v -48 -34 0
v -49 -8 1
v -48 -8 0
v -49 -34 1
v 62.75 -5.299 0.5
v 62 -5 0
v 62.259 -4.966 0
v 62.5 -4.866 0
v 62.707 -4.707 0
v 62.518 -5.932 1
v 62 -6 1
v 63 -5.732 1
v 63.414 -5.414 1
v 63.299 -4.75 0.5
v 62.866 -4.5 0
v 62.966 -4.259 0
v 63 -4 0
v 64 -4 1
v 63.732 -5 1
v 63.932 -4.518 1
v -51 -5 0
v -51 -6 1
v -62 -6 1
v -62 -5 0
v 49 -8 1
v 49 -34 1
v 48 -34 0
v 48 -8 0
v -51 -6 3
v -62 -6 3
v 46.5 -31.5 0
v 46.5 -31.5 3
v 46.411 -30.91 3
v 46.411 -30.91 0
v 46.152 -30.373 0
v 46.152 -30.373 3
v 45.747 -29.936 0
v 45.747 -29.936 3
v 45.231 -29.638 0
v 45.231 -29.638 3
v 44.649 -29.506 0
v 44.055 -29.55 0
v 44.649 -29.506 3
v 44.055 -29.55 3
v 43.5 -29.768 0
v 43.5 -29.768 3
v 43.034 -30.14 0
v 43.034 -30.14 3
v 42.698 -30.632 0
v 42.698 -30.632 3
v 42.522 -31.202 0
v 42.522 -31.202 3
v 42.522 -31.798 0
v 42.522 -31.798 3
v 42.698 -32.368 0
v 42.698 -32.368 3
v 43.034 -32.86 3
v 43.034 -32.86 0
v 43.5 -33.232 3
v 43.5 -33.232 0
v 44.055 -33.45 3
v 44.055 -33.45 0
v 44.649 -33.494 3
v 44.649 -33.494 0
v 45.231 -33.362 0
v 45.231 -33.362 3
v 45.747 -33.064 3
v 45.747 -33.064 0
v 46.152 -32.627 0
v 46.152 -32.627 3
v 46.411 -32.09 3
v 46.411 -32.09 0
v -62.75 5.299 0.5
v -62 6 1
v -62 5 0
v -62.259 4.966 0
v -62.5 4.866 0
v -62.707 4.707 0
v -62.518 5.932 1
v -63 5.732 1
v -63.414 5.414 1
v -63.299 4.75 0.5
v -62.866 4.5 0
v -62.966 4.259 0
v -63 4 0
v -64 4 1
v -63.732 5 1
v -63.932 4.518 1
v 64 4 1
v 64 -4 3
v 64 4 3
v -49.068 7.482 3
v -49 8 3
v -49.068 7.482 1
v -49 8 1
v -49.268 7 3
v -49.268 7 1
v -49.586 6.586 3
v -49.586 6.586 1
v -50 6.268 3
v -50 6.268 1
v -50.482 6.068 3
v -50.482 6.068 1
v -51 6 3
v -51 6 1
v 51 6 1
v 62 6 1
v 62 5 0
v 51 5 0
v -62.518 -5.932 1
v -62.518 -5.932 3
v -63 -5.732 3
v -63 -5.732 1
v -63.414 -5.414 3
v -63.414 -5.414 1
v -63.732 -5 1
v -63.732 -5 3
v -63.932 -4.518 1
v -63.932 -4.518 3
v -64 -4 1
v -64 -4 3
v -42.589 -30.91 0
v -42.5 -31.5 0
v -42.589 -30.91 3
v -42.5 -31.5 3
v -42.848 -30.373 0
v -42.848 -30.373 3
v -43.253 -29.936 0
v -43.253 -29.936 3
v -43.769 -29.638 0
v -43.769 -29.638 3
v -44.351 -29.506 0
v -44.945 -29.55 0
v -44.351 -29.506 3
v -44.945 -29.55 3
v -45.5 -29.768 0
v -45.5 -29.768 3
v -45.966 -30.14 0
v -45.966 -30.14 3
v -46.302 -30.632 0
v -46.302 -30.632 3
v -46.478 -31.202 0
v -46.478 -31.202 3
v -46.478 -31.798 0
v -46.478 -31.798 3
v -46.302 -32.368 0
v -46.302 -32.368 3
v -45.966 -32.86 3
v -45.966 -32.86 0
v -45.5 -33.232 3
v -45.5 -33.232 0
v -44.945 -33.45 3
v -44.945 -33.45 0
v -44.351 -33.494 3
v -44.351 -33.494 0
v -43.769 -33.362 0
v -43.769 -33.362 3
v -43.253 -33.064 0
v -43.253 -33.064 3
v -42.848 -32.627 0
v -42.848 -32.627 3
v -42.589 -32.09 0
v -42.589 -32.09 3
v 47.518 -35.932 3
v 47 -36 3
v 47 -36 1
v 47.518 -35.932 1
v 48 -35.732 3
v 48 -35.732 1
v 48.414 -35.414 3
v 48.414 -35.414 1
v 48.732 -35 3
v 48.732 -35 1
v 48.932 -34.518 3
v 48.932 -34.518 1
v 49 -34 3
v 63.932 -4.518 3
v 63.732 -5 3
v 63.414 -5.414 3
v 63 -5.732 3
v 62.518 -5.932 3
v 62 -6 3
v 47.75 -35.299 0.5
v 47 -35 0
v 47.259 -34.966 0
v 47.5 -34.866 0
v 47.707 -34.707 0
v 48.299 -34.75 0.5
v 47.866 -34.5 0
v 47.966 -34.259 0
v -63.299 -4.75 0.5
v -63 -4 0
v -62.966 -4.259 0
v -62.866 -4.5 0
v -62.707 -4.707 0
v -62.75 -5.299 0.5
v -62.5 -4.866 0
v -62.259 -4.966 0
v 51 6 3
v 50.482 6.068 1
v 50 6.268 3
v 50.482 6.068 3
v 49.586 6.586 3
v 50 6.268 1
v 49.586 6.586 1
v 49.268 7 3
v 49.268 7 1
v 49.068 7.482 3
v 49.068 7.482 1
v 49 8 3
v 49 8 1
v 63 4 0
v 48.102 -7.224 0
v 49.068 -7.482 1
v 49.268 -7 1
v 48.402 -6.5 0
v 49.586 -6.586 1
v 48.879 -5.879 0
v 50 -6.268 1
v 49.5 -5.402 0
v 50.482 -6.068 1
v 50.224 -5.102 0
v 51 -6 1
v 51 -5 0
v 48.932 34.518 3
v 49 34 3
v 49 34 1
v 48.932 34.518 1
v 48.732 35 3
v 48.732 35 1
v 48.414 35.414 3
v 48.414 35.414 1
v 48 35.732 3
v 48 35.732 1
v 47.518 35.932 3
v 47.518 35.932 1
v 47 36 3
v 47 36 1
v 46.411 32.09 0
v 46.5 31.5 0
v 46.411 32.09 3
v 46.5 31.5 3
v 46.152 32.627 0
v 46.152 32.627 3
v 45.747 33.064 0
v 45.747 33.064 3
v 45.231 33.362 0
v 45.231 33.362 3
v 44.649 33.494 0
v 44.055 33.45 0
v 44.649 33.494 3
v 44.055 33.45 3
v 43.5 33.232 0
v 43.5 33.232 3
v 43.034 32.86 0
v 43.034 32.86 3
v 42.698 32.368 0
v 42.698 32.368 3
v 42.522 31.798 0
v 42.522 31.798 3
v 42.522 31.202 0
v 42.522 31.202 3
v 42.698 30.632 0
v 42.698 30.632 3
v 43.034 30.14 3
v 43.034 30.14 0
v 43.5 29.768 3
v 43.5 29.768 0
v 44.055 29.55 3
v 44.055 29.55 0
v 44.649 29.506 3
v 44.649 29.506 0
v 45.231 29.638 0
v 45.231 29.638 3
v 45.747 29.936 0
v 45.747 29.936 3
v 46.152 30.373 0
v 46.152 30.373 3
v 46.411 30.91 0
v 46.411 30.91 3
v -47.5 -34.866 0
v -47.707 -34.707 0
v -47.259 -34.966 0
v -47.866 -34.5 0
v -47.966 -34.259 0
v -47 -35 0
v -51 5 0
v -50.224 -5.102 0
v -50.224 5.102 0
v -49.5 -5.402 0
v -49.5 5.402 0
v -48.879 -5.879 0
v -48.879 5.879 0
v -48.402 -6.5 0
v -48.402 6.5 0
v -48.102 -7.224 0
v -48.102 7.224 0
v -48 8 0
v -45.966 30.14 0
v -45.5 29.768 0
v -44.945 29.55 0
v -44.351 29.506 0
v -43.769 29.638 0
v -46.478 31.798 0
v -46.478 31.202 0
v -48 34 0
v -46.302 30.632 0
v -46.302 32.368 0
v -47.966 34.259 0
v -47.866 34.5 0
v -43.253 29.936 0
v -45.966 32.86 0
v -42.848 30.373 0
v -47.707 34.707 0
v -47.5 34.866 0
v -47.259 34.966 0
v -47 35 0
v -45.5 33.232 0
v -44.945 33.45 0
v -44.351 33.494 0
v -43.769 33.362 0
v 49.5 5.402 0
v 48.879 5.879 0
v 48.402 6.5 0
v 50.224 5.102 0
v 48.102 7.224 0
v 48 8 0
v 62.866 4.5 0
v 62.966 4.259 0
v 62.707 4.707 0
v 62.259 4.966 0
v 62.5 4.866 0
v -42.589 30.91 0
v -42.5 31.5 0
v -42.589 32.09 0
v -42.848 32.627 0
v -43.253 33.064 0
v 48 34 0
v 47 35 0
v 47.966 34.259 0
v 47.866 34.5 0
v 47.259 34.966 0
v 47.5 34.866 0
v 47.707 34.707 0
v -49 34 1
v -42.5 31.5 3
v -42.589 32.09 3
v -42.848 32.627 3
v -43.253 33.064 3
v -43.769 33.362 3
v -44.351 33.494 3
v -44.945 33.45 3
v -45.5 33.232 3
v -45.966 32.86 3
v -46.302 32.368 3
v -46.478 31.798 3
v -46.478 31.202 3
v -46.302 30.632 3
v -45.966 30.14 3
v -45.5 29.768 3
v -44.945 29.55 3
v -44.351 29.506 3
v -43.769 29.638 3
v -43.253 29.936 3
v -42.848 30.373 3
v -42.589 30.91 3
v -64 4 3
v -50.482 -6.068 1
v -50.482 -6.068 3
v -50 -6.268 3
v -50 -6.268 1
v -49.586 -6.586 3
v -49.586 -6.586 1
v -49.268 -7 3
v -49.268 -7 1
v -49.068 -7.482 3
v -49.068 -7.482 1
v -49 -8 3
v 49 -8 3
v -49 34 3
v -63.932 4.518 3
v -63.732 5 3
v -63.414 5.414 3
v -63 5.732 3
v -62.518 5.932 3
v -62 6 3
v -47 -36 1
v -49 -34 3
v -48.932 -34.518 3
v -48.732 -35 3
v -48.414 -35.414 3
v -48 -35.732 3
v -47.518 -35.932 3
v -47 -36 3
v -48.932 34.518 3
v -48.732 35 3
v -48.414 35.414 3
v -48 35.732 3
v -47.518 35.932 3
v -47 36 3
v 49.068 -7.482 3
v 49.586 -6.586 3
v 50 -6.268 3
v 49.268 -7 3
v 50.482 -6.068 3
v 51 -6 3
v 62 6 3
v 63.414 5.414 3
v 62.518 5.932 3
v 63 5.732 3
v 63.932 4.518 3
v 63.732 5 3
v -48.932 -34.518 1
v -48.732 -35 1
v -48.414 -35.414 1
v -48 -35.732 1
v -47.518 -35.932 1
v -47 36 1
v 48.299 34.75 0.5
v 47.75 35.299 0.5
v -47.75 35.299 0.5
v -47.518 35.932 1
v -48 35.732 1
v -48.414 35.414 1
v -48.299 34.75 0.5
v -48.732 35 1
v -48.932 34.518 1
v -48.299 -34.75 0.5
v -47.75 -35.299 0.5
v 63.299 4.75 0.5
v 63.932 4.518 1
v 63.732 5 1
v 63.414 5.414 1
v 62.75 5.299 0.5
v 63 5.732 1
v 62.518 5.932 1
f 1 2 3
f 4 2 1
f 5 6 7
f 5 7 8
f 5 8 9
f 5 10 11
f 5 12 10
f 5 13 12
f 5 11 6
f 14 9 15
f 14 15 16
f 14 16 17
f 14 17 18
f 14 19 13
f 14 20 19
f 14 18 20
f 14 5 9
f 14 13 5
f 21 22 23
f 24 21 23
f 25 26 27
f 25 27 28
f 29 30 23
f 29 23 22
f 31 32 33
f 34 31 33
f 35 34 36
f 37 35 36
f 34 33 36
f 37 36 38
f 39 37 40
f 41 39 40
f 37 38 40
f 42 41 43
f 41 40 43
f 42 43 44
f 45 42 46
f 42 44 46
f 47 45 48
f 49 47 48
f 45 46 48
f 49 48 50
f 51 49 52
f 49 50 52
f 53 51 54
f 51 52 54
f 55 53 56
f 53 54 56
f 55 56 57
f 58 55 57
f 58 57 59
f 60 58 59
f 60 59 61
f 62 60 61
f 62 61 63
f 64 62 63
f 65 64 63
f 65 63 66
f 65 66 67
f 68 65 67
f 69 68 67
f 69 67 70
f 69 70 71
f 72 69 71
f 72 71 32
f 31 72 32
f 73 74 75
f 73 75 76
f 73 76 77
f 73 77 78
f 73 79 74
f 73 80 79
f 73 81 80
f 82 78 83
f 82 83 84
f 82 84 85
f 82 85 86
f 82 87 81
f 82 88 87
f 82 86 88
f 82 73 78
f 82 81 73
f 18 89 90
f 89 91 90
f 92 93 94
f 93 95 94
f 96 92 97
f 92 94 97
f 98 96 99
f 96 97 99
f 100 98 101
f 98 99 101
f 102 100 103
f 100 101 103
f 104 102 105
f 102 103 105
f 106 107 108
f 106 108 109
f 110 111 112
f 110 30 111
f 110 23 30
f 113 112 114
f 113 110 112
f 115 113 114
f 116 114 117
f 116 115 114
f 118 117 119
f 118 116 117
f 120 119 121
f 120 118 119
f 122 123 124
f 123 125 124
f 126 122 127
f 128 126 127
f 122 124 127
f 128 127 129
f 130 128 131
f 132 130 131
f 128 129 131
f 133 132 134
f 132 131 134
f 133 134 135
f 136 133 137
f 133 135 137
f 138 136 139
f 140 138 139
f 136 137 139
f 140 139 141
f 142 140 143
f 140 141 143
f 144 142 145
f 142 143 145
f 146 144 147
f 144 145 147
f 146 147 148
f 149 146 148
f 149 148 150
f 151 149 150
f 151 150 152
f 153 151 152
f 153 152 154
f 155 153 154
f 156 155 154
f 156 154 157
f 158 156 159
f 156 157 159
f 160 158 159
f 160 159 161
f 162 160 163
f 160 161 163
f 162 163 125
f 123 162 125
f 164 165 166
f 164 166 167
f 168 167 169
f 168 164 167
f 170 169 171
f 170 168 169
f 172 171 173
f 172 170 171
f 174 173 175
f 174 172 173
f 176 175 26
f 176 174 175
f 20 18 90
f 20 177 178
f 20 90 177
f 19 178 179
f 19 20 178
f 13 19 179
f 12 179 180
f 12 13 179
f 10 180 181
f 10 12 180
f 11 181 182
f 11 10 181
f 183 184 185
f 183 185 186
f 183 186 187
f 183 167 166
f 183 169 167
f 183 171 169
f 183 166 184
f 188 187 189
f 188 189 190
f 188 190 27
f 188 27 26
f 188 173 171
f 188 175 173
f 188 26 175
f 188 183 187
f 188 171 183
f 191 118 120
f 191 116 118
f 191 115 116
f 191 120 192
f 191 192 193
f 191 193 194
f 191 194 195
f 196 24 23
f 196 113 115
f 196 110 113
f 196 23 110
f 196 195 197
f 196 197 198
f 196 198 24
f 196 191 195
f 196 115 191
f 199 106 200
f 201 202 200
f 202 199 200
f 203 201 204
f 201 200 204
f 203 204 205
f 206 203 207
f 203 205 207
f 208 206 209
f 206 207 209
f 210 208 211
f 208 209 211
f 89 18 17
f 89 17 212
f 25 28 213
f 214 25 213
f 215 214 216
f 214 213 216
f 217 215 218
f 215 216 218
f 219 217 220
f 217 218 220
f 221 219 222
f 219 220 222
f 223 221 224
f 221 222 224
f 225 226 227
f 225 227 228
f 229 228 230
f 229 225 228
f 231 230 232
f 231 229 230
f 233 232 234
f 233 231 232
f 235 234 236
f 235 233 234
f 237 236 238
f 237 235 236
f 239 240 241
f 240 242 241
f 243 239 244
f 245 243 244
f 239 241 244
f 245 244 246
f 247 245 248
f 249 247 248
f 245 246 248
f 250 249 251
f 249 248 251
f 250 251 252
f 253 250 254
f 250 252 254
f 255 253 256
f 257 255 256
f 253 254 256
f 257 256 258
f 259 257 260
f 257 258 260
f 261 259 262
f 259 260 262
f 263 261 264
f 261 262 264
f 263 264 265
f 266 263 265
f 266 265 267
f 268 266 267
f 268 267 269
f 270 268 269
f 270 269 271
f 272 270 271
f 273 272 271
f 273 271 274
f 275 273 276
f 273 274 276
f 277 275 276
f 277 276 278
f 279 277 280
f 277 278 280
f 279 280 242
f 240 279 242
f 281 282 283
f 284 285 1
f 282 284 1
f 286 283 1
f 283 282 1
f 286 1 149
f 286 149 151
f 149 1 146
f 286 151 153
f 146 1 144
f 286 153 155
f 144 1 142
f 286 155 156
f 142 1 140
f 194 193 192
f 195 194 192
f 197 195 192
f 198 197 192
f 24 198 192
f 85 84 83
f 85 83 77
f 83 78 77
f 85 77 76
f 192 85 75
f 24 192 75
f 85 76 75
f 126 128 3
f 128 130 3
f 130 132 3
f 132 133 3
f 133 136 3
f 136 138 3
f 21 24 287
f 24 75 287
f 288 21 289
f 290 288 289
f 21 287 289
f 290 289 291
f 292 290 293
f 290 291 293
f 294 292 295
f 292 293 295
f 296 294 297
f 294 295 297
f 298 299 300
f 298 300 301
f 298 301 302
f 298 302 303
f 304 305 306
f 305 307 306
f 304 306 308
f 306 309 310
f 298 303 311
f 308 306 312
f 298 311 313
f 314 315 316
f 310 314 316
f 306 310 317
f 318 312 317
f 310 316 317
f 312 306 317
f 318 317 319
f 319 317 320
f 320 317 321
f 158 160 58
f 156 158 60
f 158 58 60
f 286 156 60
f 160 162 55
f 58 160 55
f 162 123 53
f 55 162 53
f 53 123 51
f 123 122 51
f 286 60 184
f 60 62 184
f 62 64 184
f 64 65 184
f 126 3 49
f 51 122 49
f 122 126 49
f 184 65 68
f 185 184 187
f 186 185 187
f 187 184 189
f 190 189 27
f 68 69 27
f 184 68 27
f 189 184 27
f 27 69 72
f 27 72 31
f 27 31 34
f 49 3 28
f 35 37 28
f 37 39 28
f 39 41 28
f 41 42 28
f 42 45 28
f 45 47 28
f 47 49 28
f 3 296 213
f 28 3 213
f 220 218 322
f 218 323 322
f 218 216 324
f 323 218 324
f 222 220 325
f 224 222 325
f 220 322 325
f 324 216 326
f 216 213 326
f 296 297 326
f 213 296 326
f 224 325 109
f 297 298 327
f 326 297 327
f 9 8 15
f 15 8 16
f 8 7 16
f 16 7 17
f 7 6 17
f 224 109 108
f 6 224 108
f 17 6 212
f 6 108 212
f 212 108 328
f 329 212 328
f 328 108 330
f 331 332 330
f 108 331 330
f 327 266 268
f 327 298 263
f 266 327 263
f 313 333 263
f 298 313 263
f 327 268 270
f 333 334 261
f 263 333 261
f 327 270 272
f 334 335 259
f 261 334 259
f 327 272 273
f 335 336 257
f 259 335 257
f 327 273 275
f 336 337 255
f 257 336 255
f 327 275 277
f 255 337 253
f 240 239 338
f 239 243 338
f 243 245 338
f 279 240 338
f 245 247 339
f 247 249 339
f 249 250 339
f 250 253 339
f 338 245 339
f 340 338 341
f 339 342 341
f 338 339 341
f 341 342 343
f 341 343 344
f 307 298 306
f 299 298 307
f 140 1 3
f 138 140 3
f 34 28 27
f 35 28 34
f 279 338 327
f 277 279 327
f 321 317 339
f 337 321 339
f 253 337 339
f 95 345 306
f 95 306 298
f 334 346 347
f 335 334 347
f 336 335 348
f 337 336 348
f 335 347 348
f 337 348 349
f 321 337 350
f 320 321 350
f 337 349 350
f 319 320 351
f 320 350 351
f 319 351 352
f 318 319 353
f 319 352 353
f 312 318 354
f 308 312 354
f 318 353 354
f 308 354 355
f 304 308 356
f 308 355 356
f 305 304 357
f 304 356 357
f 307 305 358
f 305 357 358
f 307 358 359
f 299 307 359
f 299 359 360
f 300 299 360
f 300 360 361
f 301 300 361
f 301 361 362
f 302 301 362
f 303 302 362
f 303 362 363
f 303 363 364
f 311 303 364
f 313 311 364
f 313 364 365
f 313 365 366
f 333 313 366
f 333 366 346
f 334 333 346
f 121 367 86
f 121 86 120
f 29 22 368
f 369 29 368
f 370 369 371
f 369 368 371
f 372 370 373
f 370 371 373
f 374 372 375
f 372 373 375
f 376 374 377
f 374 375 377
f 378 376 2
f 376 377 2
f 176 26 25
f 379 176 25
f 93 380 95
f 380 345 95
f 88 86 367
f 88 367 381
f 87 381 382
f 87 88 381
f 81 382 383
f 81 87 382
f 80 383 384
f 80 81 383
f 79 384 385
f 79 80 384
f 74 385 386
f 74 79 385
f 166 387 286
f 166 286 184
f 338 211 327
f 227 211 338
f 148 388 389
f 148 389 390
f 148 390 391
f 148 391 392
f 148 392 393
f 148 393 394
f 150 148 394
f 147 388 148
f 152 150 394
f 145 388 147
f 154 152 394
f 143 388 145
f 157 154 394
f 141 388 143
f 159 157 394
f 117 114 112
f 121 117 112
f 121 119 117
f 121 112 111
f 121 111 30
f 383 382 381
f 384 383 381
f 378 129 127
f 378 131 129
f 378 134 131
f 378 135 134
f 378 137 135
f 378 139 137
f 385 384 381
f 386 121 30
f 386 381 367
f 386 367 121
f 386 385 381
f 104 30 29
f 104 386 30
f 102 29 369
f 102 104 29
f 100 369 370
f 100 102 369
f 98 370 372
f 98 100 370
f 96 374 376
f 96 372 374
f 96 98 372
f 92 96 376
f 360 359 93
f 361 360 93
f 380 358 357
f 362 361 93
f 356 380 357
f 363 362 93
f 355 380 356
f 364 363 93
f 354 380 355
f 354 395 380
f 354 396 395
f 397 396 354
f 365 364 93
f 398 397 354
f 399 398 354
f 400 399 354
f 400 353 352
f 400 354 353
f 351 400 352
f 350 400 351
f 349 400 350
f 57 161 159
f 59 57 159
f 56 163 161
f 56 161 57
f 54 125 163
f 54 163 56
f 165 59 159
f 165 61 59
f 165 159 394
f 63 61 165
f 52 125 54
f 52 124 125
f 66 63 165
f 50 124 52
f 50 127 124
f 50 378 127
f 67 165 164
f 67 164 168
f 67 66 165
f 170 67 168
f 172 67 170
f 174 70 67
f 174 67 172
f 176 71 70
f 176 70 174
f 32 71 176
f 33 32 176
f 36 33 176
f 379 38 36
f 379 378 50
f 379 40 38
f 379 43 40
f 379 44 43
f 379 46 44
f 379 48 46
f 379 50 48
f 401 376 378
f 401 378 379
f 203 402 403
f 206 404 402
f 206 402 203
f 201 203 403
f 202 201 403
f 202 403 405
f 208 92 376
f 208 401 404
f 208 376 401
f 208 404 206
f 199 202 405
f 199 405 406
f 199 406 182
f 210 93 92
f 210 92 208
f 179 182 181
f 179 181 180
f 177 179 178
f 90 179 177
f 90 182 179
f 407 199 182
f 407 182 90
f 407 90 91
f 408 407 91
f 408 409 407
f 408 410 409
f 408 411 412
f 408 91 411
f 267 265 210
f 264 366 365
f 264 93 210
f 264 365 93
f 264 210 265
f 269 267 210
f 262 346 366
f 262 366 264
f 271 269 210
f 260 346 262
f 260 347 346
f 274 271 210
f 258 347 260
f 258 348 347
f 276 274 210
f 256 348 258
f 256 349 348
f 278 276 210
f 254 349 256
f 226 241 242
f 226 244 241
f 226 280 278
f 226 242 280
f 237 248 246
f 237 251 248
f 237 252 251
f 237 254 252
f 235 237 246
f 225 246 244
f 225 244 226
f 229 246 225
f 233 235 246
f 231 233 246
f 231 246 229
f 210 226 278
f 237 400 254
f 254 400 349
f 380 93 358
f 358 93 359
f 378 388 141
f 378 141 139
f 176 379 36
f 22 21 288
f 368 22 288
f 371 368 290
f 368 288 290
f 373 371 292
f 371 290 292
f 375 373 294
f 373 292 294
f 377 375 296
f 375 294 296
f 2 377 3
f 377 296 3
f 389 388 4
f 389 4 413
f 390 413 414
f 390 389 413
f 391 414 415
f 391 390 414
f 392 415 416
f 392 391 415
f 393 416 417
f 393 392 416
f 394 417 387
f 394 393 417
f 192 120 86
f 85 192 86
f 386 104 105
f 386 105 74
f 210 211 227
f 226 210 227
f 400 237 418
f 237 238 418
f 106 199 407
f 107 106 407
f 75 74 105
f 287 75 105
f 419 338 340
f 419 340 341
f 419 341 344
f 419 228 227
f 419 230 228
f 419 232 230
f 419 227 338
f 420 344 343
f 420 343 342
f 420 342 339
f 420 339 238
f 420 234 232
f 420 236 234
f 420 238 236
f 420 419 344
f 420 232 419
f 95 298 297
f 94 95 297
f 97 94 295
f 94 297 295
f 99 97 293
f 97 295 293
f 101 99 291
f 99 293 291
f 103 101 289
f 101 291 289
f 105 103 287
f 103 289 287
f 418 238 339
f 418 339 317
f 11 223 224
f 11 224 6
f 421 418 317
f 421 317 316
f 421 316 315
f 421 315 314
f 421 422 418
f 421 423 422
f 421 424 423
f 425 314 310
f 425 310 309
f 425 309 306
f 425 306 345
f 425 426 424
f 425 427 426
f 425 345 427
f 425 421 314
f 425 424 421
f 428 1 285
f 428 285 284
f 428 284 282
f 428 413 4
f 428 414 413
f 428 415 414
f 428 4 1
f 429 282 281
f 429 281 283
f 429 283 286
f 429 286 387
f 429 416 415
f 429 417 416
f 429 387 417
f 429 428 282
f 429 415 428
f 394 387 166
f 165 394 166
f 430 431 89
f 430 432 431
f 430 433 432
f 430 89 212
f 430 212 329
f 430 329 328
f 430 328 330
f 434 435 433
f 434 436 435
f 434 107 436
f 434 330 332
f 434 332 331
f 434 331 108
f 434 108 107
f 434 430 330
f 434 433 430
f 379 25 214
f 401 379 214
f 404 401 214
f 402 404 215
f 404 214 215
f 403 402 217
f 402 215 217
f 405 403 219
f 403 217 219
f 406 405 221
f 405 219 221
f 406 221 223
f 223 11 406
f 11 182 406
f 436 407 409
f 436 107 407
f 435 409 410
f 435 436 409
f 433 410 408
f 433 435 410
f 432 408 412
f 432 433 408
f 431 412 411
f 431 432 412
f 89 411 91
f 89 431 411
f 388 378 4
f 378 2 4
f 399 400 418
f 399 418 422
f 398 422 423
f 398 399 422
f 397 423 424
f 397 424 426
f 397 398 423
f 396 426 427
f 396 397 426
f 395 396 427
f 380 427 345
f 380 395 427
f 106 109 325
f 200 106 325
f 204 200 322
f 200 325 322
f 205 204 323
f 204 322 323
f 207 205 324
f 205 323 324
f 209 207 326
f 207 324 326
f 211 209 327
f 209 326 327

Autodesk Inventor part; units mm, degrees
ref_plane "YZ Plane" through (0, 0, 0) normal (1, 0, 0) x (0, 1, 0)
ref_plane "XZ Plane" through (0, 0, 0) normal (0, 1, 0) x (-1, 0, 0)
ref_plane "XY Plane" through (0, 0, 0) normal (0, 0, 1) x (1, 0, 0)
sketch "Sketch1" plane through (0, 0, 0) normal (0, 0, 1) x (1, 0, 0)
  line L0 (-49, -36) -> (49, -36)
  line L1 (49, -36) -> (49, 36)
  line L2 (49, 36) -> (-49, 36)
  line L3 (-49, 36) -> (-49, -36)
  line L4 (-49, -36) -> (49, 36) construction
  line L5 (49, -36) -> (-49, 36) construction
  point P0 (0, 0)
  dimension "d0" = 98
  dimension "d1" = 72
extrude "Extrusion1" add sketch "Sketch1" along normal blind 3
sketch "Sketch2" plane through (0, 0, 3) normal (0, 0, 1) x (1, 0, 0)
  circle A0 centre (-44.5, 31.5) radius 2
  line L0 (-68.6, 0) -> (68.6, 0) projected
  line L1 (0, 50.4) -> (0, -50.4) construction
  circle A1 centre (44.5, 31.5) radius 2
  circle A2 centre (-44.5, -31.5) radius 2
  circle A3 centre (44.5, -31.5) radius 2
  point P0 (0, 0)
  dimension "d4" = 4
  dimension "d5" = 89
  dimension "d6" = 63
extrude "Extrusion2" cut sketch "Sketch2" against normal through all
sketch "Sketch3" plane through (0, 0, 3) normal (0, 0, 1) x (1, 0, 0)
  line L0 (-68.6, 0) -> (68.6, 0) construction
  line L1 (-64, -6) -> (-49, -6)
  line L2 (-49, -6) -> (-49, 6)
  line L3 (-49, 6) -> (-64, 6)
  line L4 (-64, 6) -> (-64, -6)
  line L5 (-64, -6) -> (-49, 6) construction
  line L6 (-49, -6) -> (-64, 6) construction
  line L7 (-49, 36) -> (-49, -36) construction
  line L8 (0, 50.4) -> (0, -50.4) projected
  line L9 (64, -6) -> (49, -6)
  line L10 (49, -6) -> (49, 6)
  line L11 (49, 6) -> (64, 6)
  line L12 (64, 6) -> (64, -6)
  line L13 (64, -6) -> (49, 6) construction
  line L14 (49, -6) -> (64, 6) construction
  point P0 (0, 0)
  point P1 (-56.5, 0)
  point P2 (-49, 0)
  point P3 (56.5, 0)
  point P4 (49, 0)
  dimension "d9" = 12
  dimension "d10" = 15
extrude "Extrusion3" add sketch "Sketch3" against normal up to surface (3 mm away)
fillet "Fillet1" radius 2 12 edges at (-49, 6, 1.5) (-49, -6, 1.5) (49, -6, 1.5) (49, 6, 1.5) (49, 36, 1.5) (-49, 36, 1.5) (-49, -36, 1.5) (-64, -6, 1.5) (-64, 6, 1.5) (49, -36, 1.5) (64, -6, 1.5) (64, 6, 1.5)
chamfer "Chamfer1" distance 1 angle 45 10 edges at (0, 36, 0) (-48.4142, 35.4142, 0) (-49, 21, 0) (-49, -21, 0) (-48.4142, -35.4142, 0) (0, -36, 0) (48.4142, -35.4142, 0) (49, -21, 0) (49, 21, 0) (48.4142, 35.4142, 0)
sketch "Sketch4" plane through (0, 0, 0) normal (0, 0, -1) x (-1, 0, 0)
  circle A0 centre (-51, -8) radius 1.5
  line L0 (-49, -8) -> (-49, -34) projected
  line L1 (-62, -6) -> (-51, -6) projected
  point P0 (0, 0)
  dimension "d17" = 2
  dimension "d18" = 2
  dimension "d19" = 3
equation "\"d18\" = d17"
properties part number "BatteryHolder"
